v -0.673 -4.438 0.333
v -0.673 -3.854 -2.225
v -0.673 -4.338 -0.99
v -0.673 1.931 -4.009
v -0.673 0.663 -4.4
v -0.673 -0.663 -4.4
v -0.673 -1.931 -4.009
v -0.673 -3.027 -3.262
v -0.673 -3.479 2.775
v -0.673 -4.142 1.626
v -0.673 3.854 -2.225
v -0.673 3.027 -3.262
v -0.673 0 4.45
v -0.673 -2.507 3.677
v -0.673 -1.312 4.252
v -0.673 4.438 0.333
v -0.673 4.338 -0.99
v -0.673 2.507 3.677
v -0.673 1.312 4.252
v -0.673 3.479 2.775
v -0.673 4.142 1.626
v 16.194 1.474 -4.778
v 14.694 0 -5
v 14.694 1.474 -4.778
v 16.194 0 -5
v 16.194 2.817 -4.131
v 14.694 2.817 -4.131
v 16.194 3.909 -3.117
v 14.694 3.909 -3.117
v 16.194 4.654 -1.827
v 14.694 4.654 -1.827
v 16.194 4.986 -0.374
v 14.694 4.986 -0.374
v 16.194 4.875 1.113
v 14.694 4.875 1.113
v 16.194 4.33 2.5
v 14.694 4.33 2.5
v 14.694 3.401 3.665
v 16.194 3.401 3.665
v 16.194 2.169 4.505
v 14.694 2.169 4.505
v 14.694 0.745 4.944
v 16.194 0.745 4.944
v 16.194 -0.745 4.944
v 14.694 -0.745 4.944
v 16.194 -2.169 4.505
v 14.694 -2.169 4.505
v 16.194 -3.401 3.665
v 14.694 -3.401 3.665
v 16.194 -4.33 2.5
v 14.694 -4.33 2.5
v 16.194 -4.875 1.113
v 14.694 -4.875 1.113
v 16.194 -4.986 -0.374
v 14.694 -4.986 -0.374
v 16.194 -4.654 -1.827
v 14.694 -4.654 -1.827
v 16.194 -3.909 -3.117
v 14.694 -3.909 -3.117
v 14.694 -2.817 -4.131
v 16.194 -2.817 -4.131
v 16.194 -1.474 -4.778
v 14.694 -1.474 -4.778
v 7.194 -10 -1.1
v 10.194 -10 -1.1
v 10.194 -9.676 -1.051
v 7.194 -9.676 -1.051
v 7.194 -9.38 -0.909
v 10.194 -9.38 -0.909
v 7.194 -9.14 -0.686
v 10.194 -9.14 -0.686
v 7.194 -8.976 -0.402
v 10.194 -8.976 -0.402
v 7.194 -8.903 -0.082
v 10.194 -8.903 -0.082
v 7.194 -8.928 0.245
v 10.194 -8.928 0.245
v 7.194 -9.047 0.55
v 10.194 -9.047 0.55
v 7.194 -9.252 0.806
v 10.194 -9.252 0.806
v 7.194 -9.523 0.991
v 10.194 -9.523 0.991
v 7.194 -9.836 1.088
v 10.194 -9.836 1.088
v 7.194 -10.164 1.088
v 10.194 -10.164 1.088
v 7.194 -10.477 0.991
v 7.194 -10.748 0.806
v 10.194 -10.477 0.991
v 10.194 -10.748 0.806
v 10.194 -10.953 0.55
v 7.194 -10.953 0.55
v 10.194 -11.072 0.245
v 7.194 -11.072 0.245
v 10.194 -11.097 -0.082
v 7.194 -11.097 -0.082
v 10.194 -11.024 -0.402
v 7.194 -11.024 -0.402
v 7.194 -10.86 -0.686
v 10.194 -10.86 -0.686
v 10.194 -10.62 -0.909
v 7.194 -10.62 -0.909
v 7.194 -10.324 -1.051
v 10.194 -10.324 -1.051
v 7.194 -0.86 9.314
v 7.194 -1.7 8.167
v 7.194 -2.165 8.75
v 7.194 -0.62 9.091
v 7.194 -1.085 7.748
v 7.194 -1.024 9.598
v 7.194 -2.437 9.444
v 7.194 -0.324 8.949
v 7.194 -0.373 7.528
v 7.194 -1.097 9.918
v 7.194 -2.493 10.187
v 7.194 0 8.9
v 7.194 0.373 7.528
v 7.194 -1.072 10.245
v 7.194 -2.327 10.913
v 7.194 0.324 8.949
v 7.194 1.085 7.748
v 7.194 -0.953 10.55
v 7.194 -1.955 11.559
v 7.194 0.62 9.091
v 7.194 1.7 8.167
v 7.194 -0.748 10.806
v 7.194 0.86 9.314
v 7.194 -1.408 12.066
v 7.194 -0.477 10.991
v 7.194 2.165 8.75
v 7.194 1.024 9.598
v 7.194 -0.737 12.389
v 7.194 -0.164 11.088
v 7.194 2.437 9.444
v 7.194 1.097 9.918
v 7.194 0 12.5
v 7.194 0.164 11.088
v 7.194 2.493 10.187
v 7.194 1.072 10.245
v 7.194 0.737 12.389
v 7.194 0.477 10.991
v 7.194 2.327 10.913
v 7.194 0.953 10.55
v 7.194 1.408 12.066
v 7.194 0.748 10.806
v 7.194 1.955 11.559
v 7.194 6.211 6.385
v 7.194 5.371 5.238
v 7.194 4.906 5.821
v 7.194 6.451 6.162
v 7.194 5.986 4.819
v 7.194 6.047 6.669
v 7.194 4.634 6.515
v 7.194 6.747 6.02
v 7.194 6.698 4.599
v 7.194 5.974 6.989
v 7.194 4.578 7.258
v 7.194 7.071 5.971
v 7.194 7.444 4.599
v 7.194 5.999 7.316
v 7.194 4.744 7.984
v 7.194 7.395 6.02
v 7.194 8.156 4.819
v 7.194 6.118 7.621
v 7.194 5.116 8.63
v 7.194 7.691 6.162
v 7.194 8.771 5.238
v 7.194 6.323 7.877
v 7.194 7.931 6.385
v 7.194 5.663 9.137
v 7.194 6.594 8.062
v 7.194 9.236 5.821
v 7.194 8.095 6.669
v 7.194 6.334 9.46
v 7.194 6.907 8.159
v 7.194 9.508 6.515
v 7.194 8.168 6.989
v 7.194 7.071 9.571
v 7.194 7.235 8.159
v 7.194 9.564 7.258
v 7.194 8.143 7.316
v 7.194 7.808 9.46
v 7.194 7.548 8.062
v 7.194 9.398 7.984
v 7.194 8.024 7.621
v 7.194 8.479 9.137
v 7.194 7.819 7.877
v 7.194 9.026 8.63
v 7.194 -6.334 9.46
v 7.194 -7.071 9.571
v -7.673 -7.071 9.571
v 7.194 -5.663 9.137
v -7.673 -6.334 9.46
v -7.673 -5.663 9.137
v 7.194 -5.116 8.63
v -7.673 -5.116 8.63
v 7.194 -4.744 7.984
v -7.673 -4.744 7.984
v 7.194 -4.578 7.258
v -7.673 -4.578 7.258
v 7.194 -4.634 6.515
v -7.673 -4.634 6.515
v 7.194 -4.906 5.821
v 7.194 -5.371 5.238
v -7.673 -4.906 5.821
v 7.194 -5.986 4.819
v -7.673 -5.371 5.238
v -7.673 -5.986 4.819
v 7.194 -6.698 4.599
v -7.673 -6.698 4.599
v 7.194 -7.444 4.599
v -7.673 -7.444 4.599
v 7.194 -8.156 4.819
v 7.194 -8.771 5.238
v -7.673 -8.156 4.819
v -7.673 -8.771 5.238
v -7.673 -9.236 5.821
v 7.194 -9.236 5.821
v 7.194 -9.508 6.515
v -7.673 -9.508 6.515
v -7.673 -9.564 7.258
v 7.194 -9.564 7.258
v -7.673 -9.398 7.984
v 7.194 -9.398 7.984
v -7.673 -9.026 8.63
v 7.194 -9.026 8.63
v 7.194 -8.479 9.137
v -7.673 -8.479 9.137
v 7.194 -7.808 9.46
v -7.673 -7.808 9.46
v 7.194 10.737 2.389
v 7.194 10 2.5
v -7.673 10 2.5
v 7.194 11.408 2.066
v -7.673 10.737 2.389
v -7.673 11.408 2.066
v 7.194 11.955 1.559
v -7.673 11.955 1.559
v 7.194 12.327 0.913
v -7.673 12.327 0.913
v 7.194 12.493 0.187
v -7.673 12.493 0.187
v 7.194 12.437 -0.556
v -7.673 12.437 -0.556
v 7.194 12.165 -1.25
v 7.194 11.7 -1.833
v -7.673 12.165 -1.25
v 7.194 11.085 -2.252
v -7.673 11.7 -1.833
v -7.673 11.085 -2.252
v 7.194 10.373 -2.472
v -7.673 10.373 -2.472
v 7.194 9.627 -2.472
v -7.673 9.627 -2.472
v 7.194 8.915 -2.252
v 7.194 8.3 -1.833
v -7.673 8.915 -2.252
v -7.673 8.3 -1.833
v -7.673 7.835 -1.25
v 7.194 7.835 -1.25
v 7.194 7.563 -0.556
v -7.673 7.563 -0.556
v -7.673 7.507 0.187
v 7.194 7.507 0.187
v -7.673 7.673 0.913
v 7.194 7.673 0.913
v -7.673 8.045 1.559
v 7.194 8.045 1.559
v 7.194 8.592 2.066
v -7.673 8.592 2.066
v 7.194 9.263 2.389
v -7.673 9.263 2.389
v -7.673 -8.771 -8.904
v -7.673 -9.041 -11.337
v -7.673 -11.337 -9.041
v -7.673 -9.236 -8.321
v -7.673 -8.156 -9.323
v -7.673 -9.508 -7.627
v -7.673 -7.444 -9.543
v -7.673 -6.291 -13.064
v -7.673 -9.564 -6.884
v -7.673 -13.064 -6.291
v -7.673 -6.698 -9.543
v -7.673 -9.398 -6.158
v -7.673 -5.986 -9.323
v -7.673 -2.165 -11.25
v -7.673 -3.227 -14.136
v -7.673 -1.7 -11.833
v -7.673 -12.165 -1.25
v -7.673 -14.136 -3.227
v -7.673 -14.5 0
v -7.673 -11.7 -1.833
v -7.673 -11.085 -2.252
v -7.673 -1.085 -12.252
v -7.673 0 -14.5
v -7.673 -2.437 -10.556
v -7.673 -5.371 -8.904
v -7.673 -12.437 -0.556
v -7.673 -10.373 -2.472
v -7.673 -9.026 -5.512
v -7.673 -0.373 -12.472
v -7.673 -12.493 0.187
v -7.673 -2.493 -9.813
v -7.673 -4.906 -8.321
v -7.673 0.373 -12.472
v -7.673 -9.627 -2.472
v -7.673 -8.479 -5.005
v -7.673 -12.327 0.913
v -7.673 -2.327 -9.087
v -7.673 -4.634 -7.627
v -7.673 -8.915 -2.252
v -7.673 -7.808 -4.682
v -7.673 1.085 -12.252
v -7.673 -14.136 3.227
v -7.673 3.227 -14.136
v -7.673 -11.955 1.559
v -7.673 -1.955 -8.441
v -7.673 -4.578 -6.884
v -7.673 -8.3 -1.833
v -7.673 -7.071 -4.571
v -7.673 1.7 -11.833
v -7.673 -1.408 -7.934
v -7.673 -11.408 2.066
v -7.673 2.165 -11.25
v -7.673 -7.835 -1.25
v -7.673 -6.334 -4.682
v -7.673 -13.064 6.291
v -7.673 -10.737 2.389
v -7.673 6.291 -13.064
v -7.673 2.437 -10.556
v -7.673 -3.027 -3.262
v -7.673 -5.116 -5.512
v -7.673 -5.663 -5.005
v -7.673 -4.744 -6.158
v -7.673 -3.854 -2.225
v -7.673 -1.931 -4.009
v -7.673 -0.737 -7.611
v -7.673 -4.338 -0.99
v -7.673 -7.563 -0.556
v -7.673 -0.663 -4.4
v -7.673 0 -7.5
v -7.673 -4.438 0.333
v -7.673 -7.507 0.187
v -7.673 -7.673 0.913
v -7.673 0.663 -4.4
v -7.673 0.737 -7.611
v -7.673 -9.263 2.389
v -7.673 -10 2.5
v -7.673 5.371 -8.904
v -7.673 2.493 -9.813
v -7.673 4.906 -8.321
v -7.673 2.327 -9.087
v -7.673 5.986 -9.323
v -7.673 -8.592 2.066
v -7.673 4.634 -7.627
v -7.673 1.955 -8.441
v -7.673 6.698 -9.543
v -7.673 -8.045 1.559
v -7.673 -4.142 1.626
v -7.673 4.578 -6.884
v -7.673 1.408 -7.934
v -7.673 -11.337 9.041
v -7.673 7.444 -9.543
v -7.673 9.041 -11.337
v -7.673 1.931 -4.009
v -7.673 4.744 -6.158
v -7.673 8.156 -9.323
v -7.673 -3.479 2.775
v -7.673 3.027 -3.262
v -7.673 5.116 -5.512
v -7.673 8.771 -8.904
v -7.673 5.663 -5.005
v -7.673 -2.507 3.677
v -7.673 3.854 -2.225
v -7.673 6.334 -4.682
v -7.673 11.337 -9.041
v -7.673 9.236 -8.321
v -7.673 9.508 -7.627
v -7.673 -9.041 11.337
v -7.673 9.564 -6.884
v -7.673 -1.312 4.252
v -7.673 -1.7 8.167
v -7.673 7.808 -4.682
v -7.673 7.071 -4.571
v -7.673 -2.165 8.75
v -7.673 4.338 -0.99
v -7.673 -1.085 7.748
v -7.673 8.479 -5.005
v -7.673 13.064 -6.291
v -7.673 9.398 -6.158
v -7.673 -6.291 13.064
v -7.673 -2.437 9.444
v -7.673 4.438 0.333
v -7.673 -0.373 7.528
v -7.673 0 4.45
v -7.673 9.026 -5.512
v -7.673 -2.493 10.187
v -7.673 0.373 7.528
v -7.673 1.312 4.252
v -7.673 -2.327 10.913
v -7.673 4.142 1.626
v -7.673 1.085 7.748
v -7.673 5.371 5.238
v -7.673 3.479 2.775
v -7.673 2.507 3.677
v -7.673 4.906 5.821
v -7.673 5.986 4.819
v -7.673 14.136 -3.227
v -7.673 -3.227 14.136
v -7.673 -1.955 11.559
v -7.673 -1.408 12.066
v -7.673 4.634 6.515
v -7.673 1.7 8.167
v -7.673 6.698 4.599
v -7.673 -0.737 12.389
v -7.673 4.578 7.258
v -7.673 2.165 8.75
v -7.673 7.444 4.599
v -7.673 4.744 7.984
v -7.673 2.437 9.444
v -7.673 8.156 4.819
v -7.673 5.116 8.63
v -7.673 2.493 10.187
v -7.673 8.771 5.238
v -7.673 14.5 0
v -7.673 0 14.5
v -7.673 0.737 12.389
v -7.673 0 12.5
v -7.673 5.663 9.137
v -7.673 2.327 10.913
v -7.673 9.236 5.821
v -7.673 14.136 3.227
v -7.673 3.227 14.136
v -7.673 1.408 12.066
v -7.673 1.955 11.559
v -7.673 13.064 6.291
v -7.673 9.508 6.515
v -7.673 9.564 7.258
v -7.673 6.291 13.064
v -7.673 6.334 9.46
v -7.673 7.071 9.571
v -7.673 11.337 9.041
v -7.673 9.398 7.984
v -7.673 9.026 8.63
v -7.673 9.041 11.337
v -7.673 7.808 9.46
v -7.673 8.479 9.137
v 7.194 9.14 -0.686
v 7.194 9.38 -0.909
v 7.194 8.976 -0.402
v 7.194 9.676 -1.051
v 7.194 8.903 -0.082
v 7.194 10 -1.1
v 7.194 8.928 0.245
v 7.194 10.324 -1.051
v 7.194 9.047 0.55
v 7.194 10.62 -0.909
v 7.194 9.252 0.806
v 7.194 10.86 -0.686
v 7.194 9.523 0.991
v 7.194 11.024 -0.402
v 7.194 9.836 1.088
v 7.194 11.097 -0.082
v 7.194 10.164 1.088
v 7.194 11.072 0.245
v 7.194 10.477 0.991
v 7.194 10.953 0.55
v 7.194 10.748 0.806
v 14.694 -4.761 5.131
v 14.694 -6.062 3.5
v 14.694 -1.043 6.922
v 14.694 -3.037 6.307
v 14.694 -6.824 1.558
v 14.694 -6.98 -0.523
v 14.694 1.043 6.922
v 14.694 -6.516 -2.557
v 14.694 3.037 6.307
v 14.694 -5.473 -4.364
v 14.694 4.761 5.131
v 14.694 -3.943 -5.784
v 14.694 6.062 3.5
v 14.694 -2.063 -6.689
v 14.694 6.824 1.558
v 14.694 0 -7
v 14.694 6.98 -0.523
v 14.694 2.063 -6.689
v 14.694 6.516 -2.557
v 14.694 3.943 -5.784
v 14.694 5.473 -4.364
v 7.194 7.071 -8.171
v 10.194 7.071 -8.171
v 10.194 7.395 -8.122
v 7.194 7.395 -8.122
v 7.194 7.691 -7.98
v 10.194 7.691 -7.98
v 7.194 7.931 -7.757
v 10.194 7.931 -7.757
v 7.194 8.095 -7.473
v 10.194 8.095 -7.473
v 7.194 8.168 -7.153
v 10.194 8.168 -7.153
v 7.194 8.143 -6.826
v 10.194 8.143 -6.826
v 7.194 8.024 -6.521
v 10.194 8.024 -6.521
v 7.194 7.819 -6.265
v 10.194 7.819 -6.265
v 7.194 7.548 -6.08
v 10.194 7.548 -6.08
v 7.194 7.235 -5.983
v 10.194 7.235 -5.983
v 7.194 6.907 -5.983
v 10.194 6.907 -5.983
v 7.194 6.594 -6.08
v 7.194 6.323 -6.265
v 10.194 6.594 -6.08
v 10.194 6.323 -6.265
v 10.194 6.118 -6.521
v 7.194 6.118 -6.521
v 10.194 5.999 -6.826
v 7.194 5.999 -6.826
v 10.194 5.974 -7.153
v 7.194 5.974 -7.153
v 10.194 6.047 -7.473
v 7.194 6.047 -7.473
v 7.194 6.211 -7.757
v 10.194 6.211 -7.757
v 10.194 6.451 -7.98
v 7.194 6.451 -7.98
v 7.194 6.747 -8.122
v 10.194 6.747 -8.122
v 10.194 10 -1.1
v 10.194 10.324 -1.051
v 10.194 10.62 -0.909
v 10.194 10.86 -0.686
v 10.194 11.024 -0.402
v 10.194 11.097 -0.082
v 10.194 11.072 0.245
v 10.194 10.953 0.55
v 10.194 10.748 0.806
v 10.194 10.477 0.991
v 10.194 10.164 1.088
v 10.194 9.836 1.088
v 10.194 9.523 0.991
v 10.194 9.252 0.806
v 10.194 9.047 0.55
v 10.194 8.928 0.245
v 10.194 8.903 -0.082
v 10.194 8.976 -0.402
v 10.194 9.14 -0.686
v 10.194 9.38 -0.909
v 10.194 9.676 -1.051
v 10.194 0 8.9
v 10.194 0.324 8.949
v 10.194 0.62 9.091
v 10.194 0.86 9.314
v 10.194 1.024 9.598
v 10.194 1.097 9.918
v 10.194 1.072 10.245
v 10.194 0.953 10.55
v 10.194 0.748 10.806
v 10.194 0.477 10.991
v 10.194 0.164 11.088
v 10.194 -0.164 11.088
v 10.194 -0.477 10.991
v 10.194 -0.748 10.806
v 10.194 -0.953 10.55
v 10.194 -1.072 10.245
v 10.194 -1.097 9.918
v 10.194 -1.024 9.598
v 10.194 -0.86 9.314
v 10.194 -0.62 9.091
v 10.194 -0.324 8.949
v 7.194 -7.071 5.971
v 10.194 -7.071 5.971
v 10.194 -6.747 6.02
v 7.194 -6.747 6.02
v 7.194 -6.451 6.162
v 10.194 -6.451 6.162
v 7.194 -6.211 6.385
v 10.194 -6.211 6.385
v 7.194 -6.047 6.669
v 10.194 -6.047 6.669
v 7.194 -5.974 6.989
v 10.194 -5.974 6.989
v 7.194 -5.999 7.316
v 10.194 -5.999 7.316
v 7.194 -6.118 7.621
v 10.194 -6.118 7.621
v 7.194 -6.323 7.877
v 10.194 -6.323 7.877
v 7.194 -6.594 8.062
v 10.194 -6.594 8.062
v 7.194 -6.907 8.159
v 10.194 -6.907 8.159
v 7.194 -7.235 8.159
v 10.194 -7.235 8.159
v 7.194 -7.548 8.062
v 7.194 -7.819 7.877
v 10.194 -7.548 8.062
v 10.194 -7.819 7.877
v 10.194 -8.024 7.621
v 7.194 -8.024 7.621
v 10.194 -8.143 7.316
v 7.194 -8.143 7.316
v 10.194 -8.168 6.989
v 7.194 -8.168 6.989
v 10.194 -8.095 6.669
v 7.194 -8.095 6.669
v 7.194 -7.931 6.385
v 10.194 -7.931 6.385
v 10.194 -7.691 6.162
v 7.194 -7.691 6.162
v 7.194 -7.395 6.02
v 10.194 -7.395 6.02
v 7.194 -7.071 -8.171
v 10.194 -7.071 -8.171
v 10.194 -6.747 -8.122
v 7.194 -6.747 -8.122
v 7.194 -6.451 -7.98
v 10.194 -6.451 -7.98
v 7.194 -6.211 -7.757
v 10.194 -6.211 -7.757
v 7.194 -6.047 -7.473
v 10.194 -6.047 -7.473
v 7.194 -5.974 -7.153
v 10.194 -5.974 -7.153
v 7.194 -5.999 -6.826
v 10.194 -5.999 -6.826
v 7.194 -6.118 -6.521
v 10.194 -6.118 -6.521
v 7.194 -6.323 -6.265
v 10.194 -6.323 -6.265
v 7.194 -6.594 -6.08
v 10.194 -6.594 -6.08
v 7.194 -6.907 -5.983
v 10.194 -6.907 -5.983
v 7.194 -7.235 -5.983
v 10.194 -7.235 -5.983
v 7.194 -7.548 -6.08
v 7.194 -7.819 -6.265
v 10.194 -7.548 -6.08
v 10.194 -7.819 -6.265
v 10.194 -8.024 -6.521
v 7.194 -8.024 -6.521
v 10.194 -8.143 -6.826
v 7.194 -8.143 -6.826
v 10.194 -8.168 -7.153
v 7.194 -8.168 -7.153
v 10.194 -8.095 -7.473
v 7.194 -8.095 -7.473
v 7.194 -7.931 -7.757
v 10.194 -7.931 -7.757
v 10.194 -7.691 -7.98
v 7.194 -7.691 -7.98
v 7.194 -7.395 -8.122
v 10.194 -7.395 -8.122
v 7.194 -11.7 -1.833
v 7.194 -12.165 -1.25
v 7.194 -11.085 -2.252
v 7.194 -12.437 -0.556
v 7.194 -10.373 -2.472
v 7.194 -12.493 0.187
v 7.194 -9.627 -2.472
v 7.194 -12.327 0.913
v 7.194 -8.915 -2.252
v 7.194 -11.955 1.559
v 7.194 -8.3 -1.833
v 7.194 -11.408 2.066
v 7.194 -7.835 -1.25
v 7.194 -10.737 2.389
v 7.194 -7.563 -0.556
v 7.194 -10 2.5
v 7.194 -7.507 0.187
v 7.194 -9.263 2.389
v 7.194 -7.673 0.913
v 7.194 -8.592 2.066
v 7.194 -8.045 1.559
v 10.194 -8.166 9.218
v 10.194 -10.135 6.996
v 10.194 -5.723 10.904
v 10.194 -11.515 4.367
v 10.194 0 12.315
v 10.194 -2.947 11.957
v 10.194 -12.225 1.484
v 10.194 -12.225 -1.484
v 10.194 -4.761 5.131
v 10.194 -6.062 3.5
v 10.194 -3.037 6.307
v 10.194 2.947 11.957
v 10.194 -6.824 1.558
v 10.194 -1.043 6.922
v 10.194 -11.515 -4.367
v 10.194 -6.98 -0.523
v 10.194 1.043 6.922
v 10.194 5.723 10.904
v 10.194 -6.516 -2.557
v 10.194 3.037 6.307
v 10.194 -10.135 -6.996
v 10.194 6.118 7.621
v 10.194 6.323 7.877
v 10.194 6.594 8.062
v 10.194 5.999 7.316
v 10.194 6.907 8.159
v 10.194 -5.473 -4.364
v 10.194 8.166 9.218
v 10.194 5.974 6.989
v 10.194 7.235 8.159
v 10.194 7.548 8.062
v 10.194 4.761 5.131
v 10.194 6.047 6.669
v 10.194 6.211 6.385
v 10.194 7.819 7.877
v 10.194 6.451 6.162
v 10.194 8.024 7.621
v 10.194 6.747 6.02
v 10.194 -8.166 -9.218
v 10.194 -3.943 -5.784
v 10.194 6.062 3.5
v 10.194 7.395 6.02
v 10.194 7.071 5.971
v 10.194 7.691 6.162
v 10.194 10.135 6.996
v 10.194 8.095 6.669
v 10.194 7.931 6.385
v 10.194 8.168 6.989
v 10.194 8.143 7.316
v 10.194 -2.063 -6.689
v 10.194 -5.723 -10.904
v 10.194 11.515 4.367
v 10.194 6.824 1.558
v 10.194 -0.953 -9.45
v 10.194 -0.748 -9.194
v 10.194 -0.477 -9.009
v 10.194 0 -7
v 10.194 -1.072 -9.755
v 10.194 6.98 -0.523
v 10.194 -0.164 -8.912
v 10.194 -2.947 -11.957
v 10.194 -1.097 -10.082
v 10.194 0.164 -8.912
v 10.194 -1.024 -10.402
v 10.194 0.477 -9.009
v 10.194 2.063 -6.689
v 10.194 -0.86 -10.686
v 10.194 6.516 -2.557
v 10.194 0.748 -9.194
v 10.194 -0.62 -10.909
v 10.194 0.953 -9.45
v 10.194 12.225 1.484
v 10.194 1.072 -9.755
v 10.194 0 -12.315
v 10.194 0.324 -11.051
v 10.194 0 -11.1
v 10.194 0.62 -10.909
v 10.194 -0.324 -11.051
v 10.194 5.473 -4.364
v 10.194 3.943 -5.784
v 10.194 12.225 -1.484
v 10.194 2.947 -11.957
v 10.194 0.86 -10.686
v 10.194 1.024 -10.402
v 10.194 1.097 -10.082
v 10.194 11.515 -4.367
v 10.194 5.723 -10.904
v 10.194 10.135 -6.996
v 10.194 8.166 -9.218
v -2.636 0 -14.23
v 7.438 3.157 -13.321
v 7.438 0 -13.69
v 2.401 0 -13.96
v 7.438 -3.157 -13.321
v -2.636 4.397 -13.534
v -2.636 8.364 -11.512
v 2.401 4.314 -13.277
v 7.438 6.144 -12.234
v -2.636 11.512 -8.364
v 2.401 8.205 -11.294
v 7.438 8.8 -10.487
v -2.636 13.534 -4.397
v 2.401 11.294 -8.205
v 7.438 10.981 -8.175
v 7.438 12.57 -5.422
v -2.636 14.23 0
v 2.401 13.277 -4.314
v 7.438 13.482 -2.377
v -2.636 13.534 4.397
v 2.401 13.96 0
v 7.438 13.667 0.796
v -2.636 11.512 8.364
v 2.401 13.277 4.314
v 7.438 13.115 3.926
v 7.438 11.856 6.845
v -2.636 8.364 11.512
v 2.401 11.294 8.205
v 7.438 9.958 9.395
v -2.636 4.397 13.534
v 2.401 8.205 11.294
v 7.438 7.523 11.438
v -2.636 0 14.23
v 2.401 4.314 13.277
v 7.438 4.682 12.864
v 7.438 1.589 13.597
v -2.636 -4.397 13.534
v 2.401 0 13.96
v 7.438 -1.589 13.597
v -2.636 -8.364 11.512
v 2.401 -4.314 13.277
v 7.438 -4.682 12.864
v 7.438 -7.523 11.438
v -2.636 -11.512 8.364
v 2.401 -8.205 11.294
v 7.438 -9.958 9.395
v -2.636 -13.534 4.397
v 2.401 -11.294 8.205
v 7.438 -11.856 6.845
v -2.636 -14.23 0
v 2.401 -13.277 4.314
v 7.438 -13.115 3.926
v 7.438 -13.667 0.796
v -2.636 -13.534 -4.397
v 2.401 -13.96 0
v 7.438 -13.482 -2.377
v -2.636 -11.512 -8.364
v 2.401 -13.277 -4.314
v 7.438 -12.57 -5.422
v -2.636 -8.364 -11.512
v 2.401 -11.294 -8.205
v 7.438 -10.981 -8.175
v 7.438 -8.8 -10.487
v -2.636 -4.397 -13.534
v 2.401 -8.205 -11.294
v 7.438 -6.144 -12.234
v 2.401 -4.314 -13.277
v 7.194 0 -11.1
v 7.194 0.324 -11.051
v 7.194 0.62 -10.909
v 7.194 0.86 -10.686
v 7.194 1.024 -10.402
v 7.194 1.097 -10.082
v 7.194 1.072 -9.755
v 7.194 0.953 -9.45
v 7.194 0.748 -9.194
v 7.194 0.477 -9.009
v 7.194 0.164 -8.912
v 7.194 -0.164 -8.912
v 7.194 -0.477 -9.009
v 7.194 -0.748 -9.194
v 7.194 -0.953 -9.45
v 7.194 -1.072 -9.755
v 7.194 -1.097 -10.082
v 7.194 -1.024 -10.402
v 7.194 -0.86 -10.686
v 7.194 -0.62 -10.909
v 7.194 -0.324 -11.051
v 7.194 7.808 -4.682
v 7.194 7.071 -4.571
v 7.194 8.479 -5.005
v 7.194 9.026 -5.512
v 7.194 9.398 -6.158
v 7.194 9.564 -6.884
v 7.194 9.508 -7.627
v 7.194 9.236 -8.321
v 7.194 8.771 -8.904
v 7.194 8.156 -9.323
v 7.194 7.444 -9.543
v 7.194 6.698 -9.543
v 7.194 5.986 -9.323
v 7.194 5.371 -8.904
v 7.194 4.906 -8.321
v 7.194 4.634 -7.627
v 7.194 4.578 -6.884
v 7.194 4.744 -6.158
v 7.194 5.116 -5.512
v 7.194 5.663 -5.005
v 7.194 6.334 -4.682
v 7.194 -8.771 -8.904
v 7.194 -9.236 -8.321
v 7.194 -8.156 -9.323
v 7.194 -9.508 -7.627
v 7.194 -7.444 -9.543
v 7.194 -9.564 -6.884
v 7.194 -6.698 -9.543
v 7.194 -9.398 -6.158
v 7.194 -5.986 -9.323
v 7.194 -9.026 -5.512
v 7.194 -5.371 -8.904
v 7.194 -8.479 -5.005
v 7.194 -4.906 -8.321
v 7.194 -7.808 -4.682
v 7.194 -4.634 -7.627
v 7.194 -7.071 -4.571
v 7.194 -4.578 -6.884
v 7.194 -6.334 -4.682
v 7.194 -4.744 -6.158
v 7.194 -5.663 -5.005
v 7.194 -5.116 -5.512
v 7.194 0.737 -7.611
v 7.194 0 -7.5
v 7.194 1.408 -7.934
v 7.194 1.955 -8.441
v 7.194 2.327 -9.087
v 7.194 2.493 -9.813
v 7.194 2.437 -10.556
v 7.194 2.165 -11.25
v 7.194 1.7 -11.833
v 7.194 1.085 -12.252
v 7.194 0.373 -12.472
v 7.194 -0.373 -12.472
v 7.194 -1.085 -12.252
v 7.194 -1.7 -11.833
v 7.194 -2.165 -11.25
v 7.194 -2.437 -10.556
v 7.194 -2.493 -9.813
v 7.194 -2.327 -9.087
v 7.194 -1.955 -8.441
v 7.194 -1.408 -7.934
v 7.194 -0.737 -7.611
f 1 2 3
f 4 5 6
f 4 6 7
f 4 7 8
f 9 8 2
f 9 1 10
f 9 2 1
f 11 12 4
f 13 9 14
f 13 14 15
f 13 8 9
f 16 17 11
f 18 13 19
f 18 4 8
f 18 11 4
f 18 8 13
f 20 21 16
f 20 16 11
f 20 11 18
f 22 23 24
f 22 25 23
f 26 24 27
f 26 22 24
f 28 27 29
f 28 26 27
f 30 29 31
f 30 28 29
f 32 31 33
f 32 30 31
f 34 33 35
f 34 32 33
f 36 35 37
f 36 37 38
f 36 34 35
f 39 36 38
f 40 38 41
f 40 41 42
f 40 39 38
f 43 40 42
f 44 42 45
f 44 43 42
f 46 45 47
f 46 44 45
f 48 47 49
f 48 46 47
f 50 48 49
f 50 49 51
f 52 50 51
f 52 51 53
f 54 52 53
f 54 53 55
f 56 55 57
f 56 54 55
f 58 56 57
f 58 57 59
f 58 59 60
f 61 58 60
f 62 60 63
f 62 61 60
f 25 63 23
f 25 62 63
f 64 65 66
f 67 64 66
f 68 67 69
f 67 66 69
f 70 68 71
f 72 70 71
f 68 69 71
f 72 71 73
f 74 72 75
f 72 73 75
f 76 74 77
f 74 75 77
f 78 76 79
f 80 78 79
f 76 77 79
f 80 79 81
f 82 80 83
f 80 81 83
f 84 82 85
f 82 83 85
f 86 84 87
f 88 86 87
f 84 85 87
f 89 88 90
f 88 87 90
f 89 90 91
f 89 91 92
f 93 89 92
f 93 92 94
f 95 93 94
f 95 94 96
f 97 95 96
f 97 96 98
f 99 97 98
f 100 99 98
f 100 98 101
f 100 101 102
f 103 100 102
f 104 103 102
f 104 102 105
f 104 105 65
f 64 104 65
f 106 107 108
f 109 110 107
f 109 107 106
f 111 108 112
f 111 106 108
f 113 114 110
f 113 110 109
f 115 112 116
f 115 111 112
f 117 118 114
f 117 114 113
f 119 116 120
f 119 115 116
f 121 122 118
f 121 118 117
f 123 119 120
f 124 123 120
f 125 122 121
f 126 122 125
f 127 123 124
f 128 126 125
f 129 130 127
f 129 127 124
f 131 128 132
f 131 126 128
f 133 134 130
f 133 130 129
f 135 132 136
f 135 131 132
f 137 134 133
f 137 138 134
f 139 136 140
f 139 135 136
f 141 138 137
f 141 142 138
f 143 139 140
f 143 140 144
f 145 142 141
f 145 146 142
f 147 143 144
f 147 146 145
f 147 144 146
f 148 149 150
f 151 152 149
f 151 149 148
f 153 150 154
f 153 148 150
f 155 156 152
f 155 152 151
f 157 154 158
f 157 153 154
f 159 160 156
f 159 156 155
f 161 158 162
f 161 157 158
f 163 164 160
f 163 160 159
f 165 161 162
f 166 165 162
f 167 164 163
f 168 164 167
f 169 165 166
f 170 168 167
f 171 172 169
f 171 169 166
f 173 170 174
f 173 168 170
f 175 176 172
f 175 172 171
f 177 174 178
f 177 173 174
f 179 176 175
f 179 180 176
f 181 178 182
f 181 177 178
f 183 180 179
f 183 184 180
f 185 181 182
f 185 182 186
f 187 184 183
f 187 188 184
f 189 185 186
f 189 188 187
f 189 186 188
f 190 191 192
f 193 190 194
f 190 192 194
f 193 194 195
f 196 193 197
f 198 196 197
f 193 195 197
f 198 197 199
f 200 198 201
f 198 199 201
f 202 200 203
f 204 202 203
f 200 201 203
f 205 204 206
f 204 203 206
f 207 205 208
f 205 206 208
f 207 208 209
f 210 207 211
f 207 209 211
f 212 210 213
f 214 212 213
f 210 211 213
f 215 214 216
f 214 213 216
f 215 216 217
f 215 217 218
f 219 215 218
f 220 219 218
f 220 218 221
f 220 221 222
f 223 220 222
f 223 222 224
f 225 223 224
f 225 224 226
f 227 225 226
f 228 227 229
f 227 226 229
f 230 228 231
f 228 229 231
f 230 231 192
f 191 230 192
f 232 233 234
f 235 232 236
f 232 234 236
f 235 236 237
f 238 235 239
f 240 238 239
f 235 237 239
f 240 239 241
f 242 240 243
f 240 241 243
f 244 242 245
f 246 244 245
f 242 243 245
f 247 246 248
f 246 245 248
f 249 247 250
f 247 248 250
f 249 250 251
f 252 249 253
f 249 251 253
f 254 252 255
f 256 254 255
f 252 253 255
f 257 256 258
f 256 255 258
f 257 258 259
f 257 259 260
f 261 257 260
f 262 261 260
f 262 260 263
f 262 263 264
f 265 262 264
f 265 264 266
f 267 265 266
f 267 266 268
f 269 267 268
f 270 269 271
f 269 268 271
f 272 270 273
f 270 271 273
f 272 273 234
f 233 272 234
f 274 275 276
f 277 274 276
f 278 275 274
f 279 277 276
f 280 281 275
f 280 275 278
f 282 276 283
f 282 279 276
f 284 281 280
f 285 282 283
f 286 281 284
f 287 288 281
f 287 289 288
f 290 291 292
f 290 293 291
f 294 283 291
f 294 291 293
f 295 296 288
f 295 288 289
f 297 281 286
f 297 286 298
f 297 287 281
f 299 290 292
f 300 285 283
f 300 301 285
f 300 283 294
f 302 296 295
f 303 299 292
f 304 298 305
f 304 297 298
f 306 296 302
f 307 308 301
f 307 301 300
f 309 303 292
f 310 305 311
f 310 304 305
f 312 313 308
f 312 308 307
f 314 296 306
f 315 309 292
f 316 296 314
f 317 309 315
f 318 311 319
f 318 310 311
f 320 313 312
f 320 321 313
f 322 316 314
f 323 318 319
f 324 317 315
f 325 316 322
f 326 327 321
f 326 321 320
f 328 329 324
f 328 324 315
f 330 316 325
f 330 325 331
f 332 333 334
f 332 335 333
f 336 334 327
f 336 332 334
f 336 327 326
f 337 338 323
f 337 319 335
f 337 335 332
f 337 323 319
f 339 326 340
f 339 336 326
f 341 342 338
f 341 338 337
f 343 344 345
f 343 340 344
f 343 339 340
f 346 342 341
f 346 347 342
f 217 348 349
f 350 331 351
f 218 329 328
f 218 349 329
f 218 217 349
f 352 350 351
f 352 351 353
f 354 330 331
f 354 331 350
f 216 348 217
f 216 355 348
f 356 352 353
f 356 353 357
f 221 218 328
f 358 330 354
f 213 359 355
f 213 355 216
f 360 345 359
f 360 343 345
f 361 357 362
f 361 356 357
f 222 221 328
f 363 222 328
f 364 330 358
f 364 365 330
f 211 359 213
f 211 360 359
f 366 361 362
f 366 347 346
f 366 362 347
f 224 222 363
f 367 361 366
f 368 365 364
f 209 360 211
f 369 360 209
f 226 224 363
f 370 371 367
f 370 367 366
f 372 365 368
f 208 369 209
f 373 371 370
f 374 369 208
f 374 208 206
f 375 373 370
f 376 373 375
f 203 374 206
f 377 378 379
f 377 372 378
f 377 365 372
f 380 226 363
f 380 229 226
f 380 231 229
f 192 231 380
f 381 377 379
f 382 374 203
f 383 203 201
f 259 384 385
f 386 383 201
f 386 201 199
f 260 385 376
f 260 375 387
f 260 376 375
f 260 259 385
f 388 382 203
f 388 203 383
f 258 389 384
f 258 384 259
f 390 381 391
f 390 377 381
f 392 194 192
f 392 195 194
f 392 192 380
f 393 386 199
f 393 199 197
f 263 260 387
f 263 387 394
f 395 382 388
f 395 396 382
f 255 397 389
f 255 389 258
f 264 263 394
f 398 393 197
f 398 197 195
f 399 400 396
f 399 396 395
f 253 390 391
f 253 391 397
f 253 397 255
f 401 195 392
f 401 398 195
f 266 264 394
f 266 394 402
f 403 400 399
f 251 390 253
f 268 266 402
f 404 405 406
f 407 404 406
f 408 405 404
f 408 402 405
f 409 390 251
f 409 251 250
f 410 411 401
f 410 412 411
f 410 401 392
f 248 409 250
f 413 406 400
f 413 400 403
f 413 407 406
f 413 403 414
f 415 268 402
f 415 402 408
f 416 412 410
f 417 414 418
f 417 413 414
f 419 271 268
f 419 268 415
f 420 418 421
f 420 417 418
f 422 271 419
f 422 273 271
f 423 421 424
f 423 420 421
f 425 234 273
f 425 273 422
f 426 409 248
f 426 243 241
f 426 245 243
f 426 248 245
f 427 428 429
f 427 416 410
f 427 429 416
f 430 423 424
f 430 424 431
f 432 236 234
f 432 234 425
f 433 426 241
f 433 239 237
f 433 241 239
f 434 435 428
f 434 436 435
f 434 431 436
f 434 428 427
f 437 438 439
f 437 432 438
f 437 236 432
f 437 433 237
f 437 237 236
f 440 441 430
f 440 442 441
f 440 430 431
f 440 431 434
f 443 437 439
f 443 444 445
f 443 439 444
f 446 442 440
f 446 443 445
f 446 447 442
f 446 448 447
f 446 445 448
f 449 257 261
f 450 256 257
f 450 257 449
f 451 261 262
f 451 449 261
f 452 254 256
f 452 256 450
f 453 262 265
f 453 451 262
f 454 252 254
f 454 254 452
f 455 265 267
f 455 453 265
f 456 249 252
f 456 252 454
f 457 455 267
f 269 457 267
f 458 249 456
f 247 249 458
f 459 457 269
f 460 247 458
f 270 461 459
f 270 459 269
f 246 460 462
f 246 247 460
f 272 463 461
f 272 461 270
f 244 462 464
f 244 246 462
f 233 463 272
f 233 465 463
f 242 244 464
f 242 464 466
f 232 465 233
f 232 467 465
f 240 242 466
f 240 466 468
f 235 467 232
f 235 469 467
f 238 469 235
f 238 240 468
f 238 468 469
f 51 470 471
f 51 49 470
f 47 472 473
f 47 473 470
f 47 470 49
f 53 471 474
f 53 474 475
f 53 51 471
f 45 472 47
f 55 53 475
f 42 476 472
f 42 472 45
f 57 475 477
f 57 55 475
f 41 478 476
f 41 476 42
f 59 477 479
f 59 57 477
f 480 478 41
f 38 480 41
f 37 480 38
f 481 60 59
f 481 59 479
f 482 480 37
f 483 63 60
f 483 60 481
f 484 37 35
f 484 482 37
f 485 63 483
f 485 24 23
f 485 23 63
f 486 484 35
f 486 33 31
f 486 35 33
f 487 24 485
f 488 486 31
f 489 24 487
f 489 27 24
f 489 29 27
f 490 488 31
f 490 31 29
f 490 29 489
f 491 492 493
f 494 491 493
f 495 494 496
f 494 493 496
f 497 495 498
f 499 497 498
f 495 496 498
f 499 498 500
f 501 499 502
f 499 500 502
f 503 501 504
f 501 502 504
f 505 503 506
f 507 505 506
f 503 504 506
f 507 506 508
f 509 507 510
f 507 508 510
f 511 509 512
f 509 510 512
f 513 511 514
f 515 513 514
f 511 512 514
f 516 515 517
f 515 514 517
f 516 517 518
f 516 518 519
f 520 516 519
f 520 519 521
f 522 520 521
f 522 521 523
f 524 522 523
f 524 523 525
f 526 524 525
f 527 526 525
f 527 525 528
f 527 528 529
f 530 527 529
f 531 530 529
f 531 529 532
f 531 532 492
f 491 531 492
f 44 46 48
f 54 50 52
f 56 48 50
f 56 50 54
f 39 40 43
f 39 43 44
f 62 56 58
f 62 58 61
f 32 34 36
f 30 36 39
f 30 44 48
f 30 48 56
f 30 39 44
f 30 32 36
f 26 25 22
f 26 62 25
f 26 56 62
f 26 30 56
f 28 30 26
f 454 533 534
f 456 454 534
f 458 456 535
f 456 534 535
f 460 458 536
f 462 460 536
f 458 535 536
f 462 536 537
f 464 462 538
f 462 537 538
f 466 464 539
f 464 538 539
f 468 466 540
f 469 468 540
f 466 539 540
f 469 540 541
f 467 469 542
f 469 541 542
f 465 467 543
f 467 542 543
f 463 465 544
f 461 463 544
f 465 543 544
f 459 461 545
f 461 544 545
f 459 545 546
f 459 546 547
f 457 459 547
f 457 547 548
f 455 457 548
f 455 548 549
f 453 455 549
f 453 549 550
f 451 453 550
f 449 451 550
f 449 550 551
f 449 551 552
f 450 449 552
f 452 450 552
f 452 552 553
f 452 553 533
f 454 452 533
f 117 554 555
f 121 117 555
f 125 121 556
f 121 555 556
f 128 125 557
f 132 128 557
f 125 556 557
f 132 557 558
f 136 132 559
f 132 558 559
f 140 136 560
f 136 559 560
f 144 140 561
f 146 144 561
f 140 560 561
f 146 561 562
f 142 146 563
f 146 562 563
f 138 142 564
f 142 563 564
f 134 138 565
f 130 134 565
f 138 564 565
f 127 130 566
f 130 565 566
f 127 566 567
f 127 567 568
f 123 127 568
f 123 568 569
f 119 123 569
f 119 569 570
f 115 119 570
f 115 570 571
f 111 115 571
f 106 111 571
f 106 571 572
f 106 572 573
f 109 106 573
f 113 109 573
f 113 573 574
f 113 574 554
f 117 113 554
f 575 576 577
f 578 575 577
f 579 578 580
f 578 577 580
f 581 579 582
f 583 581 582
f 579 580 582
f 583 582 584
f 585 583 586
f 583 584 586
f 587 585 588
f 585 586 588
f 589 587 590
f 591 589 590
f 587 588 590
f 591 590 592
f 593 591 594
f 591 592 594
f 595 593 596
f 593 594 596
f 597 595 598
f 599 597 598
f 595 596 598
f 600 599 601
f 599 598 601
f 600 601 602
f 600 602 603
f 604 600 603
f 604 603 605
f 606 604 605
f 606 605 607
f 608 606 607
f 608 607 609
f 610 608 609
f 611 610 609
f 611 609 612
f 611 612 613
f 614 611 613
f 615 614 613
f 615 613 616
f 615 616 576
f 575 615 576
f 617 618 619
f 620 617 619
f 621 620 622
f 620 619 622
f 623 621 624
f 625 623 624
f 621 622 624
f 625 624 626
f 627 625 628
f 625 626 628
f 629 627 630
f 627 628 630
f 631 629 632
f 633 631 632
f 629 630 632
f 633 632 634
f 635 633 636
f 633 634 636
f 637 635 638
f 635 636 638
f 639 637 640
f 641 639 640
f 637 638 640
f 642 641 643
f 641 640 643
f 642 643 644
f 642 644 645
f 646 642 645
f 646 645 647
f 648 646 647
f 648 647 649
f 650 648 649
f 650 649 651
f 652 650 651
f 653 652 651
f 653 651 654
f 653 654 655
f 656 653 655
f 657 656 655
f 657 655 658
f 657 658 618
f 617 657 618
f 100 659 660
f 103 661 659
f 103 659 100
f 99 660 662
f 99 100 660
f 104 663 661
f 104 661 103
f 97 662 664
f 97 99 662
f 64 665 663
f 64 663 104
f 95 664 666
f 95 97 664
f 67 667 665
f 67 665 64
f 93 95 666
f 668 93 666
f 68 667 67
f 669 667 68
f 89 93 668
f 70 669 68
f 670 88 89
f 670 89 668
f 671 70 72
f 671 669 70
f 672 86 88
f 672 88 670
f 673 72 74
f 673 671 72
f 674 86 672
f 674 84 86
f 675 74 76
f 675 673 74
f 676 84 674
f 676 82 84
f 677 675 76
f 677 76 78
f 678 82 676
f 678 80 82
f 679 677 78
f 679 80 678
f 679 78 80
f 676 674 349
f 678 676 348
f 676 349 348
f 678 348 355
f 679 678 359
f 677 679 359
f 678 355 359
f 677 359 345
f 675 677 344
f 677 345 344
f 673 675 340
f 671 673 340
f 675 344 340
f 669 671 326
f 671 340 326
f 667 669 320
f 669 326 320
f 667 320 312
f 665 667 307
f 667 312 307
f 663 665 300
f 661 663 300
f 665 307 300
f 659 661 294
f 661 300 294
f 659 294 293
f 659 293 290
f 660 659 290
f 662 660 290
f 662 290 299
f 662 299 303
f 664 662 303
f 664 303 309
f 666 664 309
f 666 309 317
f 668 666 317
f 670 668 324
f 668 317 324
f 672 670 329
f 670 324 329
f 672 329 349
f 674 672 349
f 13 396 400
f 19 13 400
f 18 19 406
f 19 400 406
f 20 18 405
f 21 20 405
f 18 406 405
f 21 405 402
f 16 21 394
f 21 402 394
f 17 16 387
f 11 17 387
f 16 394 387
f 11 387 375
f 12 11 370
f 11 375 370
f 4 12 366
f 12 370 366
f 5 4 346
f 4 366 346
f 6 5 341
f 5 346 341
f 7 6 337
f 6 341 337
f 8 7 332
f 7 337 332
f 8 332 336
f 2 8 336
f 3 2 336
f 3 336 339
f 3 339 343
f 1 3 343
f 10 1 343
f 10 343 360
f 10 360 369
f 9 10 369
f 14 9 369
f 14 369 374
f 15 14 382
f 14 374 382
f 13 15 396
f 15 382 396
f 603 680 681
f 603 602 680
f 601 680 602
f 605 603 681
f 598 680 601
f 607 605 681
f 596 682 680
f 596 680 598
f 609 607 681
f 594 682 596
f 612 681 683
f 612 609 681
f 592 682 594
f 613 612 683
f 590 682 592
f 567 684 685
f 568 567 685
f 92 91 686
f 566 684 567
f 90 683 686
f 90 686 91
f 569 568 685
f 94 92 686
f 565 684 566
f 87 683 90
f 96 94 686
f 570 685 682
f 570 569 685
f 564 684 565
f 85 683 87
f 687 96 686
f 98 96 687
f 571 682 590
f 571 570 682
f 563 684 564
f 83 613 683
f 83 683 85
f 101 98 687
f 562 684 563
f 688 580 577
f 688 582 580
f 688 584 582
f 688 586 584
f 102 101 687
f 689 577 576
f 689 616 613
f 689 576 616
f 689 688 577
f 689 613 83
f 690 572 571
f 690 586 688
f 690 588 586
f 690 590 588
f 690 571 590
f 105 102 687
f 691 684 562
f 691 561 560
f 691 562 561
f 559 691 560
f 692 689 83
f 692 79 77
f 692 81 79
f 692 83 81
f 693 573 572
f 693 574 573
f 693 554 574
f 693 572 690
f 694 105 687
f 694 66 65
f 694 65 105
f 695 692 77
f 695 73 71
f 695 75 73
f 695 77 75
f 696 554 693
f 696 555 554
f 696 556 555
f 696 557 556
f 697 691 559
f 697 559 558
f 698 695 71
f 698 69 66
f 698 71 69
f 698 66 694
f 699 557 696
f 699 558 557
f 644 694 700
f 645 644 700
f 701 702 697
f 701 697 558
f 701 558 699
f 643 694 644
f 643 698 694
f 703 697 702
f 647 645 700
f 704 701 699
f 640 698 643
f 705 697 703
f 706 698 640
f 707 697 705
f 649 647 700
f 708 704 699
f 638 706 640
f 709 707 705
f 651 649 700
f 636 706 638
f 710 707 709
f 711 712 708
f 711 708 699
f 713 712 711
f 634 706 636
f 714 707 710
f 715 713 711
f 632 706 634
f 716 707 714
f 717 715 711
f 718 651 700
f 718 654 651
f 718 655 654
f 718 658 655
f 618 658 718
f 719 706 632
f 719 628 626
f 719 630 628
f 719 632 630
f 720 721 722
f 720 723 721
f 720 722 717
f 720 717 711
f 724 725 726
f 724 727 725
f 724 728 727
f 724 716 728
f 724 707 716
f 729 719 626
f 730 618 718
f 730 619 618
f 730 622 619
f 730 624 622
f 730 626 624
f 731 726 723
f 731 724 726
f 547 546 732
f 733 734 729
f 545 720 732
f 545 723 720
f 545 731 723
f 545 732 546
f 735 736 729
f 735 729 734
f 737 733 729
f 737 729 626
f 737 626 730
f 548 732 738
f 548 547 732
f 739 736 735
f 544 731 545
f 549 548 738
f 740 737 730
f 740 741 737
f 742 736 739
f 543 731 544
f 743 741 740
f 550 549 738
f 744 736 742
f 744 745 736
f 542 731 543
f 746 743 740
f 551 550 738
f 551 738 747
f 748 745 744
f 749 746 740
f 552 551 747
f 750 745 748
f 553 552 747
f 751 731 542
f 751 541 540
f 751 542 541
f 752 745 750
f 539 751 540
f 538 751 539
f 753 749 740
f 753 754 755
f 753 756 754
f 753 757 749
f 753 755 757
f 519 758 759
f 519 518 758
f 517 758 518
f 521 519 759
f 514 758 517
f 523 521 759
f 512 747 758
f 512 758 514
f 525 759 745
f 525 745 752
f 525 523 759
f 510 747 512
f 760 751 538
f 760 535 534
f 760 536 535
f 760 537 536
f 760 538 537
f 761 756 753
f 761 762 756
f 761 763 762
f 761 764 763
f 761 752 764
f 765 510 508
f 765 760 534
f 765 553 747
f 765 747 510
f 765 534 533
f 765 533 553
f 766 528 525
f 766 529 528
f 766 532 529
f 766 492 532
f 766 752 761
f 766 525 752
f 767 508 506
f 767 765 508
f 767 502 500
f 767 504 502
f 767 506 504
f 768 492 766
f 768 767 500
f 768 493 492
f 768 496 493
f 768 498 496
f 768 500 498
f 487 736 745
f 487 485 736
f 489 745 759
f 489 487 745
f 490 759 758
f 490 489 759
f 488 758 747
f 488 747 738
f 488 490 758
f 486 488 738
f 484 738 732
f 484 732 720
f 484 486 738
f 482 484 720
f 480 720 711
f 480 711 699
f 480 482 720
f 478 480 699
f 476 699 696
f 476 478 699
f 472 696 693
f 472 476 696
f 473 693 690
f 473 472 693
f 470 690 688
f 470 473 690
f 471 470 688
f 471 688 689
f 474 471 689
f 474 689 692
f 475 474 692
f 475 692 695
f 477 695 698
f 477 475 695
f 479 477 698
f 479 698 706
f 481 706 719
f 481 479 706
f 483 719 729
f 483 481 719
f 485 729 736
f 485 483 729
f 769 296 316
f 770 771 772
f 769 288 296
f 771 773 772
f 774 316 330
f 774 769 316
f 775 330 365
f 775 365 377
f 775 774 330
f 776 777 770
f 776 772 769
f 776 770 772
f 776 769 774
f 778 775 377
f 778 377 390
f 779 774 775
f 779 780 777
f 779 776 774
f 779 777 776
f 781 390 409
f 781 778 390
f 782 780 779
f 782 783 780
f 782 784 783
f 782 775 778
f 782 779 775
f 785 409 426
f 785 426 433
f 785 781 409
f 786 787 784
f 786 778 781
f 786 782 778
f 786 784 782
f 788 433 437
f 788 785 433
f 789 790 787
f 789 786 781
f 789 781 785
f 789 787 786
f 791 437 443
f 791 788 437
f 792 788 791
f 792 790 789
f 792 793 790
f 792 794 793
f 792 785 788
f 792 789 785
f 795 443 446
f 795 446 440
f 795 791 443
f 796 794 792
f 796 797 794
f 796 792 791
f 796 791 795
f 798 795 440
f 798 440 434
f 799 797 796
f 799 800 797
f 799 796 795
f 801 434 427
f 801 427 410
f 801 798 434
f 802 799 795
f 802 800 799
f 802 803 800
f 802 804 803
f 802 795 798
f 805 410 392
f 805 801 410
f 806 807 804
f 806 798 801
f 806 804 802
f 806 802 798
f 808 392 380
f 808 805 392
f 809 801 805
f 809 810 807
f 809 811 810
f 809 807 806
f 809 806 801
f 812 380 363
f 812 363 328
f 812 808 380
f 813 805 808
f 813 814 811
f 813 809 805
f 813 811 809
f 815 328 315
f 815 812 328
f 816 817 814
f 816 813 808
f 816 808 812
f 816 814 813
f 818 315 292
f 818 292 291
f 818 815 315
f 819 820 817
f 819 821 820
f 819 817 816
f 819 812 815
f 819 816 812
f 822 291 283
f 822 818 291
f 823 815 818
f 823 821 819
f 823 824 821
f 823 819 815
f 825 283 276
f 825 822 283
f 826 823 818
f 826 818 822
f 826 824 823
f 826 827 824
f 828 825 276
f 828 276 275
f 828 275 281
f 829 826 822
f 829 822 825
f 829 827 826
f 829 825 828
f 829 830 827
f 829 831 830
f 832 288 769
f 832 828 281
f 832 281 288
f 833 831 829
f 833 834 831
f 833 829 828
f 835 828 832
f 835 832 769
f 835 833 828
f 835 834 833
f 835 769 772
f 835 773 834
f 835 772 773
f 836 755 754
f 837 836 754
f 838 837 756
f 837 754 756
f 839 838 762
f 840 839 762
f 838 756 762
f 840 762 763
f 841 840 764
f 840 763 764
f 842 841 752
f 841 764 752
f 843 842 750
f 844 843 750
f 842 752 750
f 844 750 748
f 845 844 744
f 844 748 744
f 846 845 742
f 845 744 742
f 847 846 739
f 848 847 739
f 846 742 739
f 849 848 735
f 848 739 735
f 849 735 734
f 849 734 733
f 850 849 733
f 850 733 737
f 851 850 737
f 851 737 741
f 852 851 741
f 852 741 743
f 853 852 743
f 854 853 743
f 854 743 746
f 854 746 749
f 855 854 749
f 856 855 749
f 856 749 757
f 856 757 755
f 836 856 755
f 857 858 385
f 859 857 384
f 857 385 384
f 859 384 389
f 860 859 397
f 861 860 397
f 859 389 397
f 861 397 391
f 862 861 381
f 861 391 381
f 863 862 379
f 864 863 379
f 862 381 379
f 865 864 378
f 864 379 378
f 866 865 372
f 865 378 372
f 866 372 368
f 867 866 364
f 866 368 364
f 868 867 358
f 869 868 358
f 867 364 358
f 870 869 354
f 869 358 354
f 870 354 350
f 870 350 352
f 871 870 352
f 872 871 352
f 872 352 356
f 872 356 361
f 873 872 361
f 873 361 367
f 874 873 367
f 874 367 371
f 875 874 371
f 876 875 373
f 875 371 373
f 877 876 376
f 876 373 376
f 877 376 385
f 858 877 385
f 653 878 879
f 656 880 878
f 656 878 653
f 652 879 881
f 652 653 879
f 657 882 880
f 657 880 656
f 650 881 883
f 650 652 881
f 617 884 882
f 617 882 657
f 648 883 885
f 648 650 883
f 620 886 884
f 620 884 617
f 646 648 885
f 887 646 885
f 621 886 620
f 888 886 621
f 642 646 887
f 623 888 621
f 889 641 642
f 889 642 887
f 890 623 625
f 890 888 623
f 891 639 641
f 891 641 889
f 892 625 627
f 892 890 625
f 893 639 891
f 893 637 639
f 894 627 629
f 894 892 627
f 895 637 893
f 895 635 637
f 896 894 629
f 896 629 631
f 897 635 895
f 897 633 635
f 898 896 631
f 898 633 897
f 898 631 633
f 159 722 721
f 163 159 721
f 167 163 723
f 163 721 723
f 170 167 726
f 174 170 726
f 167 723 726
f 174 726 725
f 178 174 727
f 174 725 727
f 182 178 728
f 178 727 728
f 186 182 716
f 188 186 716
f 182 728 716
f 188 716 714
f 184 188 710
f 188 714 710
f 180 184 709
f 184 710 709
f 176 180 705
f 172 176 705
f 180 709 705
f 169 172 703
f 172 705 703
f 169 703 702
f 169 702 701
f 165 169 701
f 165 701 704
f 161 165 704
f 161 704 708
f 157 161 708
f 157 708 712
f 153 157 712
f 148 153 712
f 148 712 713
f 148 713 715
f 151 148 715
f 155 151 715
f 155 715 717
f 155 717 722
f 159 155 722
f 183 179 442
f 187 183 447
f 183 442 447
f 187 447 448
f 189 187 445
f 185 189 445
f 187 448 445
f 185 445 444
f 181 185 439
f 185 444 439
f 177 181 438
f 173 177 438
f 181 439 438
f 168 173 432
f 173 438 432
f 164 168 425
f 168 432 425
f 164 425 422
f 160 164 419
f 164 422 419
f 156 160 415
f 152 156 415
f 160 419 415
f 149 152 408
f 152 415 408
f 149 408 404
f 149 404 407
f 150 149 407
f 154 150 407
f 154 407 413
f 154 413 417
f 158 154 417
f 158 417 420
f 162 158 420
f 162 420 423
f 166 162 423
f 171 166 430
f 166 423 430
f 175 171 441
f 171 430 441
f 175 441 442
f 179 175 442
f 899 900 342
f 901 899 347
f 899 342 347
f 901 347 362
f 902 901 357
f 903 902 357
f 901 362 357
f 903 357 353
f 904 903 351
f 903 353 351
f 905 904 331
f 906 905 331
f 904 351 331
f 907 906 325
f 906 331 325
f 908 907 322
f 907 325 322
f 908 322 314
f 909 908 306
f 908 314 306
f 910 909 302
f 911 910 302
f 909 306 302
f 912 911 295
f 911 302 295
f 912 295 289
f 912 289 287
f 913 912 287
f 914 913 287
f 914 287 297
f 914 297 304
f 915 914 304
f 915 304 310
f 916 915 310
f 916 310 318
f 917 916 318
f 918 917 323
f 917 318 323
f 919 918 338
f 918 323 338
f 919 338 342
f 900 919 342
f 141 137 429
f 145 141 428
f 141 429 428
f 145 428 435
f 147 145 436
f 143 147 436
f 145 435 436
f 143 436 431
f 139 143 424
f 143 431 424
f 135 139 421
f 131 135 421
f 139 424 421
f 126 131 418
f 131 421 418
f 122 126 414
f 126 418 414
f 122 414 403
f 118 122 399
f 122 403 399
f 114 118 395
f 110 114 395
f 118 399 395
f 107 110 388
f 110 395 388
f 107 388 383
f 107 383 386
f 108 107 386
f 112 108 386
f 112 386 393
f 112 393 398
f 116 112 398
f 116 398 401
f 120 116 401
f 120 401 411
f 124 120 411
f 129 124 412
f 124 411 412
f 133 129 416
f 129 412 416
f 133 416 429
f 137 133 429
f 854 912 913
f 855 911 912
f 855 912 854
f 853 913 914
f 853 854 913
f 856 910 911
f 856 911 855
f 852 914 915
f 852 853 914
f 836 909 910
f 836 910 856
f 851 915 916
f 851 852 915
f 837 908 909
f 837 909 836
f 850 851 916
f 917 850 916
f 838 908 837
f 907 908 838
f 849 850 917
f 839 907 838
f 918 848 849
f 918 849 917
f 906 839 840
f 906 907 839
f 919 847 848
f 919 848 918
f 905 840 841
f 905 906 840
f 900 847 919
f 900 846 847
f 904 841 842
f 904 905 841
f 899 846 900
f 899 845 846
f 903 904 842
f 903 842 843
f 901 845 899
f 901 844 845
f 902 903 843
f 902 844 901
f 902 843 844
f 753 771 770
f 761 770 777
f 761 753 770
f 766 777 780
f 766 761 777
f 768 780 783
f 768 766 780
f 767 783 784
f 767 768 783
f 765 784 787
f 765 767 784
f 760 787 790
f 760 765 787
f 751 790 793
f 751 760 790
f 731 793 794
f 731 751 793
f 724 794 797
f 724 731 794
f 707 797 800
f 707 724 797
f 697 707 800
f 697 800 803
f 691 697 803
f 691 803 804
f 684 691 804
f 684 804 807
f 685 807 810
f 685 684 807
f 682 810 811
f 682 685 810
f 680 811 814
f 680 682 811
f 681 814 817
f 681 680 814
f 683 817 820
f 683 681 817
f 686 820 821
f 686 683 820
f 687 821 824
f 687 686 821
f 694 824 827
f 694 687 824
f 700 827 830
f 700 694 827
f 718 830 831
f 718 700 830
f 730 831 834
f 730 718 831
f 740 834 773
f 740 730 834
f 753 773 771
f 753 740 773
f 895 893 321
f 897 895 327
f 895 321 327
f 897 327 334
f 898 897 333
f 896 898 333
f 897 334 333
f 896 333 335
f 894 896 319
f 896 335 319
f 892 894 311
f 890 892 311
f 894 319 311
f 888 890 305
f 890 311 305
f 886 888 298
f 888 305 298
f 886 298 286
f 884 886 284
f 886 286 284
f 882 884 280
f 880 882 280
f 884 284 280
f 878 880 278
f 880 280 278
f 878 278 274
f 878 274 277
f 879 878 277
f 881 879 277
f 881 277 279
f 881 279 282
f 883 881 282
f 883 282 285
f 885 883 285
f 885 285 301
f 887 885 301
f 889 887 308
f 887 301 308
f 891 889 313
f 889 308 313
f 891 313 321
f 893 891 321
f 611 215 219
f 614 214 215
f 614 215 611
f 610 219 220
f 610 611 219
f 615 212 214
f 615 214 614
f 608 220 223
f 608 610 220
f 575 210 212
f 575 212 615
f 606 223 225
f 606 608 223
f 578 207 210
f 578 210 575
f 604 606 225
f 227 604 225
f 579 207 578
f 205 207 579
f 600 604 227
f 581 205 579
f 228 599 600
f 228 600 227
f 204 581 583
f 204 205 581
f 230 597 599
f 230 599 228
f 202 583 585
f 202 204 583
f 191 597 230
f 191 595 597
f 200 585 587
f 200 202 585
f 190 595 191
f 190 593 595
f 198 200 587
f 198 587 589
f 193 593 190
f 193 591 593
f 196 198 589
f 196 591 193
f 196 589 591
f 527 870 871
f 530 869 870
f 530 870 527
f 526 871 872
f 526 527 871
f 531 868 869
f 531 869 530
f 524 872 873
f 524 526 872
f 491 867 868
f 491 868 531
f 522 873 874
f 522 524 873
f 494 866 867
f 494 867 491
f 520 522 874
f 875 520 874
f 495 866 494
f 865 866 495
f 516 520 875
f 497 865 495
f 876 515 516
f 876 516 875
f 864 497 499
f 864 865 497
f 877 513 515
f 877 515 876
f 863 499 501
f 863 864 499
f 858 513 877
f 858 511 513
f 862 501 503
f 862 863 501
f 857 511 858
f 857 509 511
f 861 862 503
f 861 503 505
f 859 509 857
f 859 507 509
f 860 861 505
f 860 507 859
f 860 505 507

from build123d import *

# Parameters (mm, degrees)
SKETCH2_R          = 4.45
CUT_EXTRUDE1_DEPTH = 7
SKETCH3_R          = 1.1
CUT_EXTRUDE2_DEPTH = 18.866890468
SKETCH4_R          = 2.5
CUT_EXTRUDE3_DEPTH = 14.86689


with BuildPart() as part:
    # Sketch1 → Revolve1 (revolve)
    with BuildSketch(Plane(origin=(0, 0, 0), x_dir=(1, 0, 0), z_dir=(0, 1, 0))):
        Polygon((10.193859716, 12.315), (10.193859716, 7), (14.693859716, 7), (14.693859716, 5), (16.193859716, 5), (16.193859716, 0), (-7.673030752, 0), (-7.673030752, 14.5), (7.437816357, 13.69), align=None)
    revolve(axis=Axis((-18.233766234, 0, 0), (1, 0, 0)))

    # Sketch2 → Cut-Extrude1 (cut)
    with BuildSketch(Plane.ZY.offset(7.673030752)):
        Circle(SKETCH2_R)
    extrude(amount=-CUT_EXTRUDE1_DEPTH, mode=Mode.SUBTRACT)

    # Sketch3 → Cut-Extrude2 (cut, through all)
    with BuildSketch(Plane(origin=(10.193859716, 0, 0), x_dir=(0, 0, -1), z_dir=(1, 0, 0))):
        with Locations((0, 10)):
            Circle(SKETCH3_R)
        with Locations((7.071067812, 7.071067812)):
            Circle(SKETCH3_R)
        with Locations((10, 0)):
            Circle(SKETCH3_R)
        with Locations((7.071067812, -7.071067812)):
            Circle(SKETCH3_R)
        with Locations((0, -10)):
            Circle(SKETCH3_R)
        with Locations((-7.071067812, -7.071067812)):
            Circle(SKETCH3_R)
        with Locations((-10, 0)):
            Circle(SKETCH3_R)
        with Locations((-7.071067812, 7.071067812)):
            Circle(SKETCH3_R)
    extrude(amount=-CUT_EXTRUDE2_DEPTH, mode=Mode.SUBTRACT)

    # Sketch4 → Cut-Extrude3 (cut)
    with BuildSketch(Plane.ZY.offset(7.673030752)):
        with Locations((0, 10)):
            Circle(SKETCH4_R)
        with Locations((7.071067812, 7.071067812)):
            Circle(SKETCH4_R)
        with Locations((10, 0)):
            Circle(SKETCH4_R)
        with Locations((7.071067812, -7.071067812)):
            Circle(SKETCH4_R)
        with Locations((0, -10)):
            Circle(SKETCH4_R)
        with Locations((-7.071067812, -7.071067812)):
            Circle(SKETCH4_R)
        with Locations((-10, 0)):
            Circle(SKETCH4_R)
        with Locations((-7.071067812, 7.071067812)):
            Circle(SKETCH4_R)
    extrude(amount=-CUT_EXTRUDE3_DEPTH, mode=Mode.SUBTRACT)


solid = part.part
